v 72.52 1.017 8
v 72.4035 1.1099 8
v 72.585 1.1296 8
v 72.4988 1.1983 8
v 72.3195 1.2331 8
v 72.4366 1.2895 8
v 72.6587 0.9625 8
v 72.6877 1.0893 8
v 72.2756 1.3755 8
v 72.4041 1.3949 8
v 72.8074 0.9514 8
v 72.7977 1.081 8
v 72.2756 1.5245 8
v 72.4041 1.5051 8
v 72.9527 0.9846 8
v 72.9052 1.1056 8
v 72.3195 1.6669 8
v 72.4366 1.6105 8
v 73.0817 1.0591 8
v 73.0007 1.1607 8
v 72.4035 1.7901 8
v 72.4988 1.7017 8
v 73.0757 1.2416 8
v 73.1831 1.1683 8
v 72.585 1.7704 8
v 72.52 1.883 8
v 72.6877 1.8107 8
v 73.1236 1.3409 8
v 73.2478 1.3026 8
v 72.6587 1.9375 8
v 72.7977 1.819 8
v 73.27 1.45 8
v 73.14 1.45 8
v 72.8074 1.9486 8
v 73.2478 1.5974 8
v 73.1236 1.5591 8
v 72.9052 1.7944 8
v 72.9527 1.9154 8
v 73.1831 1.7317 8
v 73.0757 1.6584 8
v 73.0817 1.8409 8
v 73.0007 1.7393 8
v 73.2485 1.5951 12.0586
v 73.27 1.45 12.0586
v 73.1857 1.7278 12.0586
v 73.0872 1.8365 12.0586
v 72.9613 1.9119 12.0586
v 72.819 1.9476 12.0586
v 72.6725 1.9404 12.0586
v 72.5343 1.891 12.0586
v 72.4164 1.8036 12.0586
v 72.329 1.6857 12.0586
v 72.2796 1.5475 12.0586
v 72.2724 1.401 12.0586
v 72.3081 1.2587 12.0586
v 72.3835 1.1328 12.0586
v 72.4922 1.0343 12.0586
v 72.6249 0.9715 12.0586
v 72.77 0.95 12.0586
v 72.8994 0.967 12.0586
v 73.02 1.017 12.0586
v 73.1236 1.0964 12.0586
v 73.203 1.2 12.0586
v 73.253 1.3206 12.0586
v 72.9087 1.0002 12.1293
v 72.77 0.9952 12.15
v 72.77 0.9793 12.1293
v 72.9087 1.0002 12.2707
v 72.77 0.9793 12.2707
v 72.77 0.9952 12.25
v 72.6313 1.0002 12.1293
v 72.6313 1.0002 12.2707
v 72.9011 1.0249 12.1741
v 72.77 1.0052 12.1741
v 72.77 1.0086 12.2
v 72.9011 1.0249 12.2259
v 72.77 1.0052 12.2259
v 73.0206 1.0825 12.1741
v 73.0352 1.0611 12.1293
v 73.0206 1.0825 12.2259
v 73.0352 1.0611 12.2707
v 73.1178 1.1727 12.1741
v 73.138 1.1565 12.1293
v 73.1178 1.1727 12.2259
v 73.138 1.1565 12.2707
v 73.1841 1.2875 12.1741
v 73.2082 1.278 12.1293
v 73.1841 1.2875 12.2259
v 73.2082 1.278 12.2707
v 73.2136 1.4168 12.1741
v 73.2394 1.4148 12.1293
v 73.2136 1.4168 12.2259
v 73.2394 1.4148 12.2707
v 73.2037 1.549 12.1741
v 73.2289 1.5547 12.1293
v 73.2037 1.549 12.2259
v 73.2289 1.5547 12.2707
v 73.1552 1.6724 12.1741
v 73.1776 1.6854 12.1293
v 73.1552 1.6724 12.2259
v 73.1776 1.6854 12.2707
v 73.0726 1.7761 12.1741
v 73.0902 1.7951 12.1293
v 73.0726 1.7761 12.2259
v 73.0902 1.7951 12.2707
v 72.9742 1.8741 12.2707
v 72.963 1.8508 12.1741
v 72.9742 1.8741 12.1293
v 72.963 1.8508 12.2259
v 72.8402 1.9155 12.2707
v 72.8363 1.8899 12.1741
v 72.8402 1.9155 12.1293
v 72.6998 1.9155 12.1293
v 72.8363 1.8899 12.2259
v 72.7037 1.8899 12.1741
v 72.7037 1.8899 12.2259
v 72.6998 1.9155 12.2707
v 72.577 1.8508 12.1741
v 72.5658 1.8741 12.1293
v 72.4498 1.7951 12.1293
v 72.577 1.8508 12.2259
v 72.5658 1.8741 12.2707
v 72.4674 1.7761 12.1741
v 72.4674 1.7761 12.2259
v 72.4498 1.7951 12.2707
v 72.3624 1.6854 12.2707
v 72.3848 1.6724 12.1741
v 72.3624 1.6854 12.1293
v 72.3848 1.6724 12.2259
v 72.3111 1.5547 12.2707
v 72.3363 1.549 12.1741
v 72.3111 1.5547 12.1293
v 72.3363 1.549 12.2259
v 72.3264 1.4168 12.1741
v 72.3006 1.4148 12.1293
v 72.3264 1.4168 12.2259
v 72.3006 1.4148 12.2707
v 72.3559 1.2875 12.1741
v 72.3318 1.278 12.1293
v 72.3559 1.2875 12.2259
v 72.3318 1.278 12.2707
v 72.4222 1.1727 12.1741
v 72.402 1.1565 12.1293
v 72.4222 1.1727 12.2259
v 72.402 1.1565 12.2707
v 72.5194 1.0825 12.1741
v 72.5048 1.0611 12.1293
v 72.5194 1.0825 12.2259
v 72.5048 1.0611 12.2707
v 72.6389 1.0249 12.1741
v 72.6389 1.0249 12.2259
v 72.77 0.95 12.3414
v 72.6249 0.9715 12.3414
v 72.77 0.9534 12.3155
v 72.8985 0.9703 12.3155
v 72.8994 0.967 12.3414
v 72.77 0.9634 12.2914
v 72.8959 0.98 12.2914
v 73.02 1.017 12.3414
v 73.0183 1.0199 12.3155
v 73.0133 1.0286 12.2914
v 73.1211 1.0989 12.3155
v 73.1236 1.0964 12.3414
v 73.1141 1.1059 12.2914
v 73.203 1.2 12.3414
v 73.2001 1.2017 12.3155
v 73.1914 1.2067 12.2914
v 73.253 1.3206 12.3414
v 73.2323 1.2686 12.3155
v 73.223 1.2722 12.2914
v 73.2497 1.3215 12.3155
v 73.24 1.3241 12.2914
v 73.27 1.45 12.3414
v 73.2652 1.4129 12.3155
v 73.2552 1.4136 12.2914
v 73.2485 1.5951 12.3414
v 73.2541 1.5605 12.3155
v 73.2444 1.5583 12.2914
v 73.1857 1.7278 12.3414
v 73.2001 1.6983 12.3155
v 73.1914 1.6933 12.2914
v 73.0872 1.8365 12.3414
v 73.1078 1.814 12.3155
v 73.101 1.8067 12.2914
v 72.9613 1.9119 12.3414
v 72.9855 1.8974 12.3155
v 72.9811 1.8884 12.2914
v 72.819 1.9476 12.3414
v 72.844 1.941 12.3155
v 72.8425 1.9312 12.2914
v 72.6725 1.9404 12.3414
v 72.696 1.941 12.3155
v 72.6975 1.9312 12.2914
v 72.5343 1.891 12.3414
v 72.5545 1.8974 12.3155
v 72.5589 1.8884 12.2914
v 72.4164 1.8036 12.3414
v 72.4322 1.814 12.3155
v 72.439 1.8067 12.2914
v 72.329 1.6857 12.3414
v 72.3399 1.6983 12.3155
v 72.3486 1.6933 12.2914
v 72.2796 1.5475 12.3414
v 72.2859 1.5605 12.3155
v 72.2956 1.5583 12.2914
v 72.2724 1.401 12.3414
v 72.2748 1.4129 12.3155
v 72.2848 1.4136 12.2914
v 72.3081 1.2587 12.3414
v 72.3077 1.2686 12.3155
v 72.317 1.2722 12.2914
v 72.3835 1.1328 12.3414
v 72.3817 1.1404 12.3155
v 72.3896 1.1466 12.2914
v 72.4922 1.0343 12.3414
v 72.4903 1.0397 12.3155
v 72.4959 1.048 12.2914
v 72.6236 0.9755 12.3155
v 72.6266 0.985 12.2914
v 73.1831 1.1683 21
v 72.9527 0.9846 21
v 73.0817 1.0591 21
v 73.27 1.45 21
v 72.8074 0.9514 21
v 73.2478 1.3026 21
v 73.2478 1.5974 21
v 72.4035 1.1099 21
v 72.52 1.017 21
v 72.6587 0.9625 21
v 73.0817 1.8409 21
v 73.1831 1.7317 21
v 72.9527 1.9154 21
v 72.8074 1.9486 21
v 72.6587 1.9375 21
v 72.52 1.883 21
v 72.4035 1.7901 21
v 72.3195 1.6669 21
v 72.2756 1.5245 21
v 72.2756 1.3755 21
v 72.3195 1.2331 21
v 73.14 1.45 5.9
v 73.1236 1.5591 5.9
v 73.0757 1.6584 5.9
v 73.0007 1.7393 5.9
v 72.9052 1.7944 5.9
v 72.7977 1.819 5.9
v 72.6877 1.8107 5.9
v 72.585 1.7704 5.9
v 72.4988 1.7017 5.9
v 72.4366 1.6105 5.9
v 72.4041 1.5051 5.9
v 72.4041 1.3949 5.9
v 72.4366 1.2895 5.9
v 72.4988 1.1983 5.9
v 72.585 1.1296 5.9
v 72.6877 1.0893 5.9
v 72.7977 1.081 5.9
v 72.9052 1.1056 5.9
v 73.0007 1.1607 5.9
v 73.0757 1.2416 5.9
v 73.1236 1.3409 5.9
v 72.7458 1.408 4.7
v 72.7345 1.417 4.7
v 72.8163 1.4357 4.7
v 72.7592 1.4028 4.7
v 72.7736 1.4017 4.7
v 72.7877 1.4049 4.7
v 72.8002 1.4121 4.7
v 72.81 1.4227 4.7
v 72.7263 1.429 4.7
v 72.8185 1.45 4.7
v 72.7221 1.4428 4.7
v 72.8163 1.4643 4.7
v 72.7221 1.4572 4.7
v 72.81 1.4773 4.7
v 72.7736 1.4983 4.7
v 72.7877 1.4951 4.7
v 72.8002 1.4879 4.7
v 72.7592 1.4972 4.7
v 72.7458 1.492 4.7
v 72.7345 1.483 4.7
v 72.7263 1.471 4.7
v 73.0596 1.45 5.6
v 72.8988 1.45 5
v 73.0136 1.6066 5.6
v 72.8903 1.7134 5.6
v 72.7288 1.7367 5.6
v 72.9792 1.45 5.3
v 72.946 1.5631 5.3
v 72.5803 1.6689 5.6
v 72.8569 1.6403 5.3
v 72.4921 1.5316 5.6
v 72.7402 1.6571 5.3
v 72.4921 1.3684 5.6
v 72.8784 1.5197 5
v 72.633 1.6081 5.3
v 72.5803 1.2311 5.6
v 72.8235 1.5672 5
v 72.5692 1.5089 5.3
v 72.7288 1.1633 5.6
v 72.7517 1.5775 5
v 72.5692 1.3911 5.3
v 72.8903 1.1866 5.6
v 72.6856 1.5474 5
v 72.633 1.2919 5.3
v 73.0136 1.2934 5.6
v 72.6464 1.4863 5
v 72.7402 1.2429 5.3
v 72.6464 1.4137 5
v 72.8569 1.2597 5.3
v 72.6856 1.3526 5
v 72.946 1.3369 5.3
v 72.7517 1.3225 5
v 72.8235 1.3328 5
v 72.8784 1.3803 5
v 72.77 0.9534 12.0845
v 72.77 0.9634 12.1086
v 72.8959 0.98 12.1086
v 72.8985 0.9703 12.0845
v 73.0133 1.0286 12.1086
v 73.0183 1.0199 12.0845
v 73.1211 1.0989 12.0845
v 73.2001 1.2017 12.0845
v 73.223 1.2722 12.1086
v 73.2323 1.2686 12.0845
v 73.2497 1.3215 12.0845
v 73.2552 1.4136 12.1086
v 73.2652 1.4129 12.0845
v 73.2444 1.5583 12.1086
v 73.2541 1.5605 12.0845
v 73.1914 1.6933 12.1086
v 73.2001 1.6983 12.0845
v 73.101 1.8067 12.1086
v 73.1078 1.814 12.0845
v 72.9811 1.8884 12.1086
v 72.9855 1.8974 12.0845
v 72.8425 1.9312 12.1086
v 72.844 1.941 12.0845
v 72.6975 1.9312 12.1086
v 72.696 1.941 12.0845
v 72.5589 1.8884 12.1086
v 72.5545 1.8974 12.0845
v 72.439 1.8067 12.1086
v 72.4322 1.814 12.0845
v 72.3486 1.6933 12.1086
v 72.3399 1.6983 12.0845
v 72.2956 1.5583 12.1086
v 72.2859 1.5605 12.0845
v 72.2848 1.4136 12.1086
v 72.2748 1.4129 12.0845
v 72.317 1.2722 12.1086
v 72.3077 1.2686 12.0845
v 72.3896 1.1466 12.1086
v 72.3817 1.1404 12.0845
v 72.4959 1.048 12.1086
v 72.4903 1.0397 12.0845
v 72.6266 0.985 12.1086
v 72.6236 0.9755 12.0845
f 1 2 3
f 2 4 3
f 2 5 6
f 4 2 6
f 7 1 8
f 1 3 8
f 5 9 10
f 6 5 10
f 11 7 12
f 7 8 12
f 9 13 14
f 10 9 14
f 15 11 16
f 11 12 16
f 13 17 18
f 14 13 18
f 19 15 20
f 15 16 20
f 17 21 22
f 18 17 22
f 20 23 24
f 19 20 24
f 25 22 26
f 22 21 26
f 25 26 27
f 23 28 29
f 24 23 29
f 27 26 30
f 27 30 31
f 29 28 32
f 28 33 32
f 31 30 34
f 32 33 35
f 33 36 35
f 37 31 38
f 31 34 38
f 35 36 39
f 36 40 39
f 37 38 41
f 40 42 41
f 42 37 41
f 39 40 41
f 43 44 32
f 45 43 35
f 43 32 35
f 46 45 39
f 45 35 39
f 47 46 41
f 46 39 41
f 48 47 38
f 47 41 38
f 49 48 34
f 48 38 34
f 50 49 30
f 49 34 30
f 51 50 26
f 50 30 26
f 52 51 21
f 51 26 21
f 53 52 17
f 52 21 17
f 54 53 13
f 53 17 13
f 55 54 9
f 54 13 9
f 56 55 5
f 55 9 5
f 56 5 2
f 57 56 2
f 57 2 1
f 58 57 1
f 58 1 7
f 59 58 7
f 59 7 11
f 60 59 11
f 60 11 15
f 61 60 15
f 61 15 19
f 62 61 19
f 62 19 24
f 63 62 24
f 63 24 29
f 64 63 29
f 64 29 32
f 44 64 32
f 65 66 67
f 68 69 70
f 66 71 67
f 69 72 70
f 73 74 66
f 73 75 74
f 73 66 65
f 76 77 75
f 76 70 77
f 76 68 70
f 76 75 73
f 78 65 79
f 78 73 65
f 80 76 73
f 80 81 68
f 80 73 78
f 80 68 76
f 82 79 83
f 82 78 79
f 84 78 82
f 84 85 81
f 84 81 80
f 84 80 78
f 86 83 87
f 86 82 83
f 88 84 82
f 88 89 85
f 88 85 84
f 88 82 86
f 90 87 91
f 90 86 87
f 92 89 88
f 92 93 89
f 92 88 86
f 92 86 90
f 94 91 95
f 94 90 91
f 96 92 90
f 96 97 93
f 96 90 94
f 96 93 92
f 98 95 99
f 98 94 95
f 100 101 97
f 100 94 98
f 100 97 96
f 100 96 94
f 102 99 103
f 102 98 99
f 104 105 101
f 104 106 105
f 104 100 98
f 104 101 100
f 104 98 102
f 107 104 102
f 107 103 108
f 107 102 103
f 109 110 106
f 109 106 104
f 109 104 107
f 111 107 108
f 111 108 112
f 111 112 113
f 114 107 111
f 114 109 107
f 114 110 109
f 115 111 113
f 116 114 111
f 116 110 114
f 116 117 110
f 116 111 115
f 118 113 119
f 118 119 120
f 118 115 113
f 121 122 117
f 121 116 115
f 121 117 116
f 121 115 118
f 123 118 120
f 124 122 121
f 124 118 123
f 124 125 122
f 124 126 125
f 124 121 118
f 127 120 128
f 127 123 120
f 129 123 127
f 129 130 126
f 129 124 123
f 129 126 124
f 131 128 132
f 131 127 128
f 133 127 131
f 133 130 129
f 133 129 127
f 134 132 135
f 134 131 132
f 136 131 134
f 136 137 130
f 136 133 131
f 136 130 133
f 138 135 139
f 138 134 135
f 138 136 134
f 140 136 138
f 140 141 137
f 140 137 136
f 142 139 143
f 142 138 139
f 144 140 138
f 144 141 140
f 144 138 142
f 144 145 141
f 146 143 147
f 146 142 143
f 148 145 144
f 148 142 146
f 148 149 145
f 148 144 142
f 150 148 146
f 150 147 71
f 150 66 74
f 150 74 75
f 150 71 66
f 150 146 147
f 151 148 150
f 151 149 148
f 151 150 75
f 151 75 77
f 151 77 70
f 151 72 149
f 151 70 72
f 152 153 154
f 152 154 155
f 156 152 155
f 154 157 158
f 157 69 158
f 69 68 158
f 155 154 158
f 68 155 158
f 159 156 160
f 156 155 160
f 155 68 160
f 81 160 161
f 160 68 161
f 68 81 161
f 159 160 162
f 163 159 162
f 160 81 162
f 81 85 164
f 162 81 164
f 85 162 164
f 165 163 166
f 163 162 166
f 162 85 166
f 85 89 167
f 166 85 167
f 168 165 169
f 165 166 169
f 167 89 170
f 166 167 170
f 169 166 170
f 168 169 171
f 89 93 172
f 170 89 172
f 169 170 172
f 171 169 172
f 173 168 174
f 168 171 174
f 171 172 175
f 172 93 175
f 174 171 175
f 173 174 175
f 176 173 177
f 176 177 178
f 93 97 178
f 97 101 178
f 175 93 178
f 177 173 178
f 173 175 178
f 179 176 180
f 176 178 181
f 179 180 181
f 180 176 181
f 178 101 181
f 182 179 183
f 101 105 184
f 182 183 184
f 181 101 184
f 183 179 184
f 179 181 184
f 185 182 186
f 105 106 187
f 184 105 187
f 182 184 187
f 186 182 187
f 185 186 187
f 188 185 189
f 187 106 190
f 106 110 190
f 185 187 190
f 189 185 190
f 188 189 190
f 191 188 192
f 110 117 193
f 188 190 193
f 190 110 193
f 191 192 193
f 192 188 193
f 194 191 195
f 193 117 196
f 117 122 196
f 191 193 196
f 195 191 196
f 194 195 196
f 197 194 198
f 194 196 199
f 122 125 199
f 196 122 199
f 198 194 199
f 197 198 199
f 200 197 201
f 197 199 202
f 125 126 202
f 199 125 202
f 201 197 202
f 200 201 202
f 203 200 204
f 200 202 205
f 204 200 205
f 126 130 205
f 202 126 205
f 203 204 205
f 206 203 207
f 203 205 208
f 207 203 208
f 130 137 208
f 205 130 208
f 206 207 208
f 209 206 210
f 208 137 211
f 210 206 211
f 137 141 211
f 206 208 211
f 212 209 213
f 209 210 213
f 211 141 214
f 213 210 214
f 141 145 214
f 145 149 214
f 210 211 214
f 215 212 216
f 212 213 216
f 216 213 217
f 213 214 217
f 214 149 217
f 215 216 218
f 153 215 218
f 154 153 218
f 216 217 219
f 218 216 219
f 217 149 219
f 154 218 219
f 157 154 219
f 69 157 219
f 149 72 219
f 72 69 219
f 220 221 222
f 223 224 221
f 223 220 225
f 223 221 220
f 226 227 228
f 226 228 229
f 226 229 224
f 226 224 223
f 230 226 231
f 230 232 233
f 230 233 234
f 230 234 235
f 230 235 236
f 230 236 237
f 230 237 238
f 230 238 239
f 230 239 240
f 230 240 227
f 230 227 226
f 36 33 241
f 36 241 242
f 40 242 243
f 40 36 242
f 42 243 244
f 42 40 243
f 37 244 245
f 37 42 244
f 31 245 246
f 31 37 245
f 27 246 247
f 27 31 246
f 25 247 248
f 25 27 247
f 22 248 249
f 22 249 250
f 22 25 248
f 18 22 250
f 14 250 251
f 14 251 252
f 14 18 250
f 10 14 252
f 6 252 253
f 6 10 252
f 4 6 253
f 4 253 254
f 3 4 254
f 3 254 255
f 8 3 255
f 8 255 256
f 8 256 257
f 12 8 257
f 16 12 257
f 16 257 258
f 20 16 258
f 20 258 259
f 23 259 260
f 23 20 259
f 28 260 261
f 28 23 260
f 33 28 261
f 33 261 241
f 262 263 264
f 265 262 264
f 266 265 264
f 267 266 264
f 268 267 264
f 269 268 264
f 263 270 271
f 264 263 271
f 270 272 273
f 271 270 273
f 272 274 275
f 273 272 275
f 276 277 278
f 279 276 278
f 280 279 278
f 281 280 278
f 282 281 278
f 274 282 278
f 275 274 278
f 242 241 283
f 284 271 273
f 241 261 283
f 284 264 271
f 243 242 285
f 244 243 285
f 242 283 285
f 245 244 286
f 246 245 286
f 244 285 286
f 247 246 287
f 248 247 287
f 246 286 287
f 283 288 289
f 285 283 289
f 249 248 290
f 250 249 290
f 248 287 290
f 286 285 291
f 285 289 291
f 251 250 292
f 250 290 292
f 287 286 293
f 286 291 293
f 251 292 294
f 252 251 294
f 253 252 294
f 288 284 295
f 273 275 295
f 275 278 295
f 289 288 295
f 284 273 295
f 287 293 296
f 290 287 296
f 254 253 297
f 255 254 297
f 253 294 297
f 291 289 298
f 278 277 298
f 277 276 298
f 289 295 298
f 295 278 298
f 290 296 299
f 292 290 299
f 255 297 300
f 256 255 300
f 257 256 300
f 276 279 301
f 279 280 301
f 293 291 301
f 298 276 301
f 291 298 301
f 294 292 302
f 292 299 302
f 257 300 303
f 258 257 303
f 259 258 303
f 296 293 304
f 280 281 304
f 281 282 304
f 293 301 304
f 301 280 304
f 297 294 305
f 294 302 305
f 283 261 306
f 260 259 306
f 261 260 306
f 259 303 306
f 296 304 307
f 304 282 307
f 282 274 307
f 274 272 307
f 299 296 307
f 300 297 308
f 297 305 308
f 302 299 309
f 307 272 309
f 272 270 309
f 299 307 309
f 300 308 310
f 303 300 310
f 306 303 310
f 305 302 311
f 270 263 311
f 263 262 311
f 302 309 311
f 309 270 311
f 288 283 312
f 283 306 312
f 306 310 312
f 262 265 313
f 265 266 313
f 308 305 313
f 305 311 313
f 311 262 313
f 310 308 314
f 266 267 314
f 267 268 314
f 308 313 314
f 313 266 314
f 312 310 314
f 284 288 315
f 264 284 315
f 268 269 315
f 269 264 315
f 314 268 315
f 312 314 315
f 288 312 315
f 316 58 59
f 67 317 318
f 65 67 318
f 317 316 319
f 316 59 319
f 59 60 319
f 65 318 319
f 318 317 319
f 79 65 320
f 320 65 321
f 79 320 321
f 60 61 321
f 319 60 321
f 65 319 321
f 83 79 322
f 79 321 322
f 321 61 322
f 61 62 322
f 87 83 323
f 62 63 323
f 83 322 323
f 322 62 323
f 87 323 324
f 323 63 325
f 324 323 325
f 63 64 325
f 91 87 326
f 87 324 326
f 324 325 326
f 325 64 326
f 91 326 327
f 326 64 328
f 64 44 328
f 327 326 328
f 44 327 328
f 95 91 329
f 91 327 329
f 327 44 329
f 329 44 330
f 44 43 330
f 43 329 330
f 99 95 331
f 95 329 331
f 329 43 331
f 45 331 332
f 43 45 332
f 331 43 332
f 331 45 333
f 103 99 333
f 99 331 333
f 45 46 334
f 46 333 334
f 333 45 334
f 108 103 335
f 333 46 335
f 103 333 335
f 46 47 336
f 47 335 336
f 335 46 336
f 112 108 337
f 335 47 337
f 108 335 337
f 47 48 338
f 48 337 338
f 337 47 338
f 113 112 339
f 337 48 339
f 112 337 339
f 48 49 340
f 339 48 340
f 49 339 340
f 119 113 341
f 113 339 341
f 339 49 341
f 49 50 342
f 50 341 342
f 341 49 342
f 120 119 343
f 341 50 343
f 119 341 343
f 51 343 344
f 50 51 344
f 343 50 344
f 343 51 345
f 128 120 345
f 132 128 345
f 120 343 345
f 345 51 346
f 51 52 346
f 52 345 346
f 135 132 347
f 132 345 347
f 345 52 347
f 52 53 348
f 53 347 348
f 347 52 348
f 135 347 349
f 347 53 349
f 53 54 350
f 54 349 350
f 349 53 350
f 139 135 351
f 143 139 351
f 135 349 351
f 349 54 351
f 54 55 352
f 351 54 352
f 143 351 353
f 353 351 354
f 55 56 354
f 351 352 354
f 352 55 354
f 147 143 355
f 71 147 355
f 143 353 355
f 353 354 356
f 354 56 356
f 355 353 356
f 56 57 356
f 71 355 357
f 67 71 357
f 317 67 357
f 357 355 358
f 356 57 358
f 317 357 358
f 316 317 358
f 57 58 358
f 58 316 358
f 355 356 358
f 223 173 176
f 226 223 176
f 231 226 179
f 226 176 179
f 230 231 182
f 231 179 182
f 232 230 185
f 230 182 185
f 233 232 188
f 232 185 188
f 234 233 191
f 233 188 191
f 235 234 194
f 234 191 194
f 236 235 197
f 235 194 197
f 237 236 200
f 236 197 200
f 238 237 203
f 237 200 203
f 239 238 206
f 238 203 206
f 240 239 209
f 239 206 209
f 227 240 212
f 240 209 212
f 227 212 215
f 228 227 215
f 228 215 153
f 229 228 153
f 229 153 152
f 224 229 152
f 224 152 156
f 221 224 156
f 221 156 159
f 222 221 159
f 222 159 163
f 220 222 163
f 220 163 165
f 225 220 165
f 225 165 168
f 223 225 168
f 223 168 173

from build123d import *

# Parameters (mm, degrees)
SKETCH037_R      = 0.5
PAD003_DEPTH     = 13
SKETCH038_R      = 0.37
PAD004_DEPTH     = 3.3
CHAMFER004_ANGLE = 15
CHAMFER004_SIZE  = 1.2


with BuildPart() as part:
    # Sketch037 → Pad003 (new body)
    with BuildSketch(Plane.XY):
        Circle(SKETCH037_R)
    extrude(amount=PAD003_DEPTH)

    # Sketch048 → Groove (revolve, cut)
    with BuildSketch(Plane.YZ):
        with BuildLine():
            ThreePointArc((-0.5, 4.341421), (-0.492388, 4.303153), (-0.470711, 4.270711))
            ThreePointArc((-0.470711, 4.129289), (-0.441421, 4.2), (-0.470711, 4.270711))
            ThreePointArc((-0.470711, 4.129289), (-0.492388, 4.096847), (-0.5, 4.058579))
            Line((-0.5, 4.341421), (-0.5, 4.058579))
        make_face()
    revolve(axis=Axis((0, 0, 0), (0, 0, 1)), mode=Mode.SUBTRACT)

    # Sketch038 → Pad004 (join)
    with BuildSketch(Plane.XY):
        Circle(SKETCH038_R)
    extrude(amount=-PAD004_DEPTH)

    # Chamfer004
    chamfer004_edges = [part.edges().sort_by_distance(p)[0] for p in [
        (-0.37, 0, -3.3),
    ]]
    chamfer004_side = part.faces().sort_by_distance((-0.37, 0, -1.65))[0]
    chamfer(chamfer004_edges, length=CHAMFER004_SIZE, angle=CHAMFER004_ANGLE, reference=chamfer004_side)


with BuildPart() as part_1:
    # Body002 placement: moved
    add(part.part.moved(Location((72, -1, 8))))


with BuildPart() as part_2:
    # Clone010 placement: moved
    add(part_1.part.moved(Location((-72, 1, -8))))


with BuildPart() as part_3:
    # Body017 placement: moved
    add(part_2.part.moved(Location((72.77, 1.45, 8))))


solid = part_3.part
